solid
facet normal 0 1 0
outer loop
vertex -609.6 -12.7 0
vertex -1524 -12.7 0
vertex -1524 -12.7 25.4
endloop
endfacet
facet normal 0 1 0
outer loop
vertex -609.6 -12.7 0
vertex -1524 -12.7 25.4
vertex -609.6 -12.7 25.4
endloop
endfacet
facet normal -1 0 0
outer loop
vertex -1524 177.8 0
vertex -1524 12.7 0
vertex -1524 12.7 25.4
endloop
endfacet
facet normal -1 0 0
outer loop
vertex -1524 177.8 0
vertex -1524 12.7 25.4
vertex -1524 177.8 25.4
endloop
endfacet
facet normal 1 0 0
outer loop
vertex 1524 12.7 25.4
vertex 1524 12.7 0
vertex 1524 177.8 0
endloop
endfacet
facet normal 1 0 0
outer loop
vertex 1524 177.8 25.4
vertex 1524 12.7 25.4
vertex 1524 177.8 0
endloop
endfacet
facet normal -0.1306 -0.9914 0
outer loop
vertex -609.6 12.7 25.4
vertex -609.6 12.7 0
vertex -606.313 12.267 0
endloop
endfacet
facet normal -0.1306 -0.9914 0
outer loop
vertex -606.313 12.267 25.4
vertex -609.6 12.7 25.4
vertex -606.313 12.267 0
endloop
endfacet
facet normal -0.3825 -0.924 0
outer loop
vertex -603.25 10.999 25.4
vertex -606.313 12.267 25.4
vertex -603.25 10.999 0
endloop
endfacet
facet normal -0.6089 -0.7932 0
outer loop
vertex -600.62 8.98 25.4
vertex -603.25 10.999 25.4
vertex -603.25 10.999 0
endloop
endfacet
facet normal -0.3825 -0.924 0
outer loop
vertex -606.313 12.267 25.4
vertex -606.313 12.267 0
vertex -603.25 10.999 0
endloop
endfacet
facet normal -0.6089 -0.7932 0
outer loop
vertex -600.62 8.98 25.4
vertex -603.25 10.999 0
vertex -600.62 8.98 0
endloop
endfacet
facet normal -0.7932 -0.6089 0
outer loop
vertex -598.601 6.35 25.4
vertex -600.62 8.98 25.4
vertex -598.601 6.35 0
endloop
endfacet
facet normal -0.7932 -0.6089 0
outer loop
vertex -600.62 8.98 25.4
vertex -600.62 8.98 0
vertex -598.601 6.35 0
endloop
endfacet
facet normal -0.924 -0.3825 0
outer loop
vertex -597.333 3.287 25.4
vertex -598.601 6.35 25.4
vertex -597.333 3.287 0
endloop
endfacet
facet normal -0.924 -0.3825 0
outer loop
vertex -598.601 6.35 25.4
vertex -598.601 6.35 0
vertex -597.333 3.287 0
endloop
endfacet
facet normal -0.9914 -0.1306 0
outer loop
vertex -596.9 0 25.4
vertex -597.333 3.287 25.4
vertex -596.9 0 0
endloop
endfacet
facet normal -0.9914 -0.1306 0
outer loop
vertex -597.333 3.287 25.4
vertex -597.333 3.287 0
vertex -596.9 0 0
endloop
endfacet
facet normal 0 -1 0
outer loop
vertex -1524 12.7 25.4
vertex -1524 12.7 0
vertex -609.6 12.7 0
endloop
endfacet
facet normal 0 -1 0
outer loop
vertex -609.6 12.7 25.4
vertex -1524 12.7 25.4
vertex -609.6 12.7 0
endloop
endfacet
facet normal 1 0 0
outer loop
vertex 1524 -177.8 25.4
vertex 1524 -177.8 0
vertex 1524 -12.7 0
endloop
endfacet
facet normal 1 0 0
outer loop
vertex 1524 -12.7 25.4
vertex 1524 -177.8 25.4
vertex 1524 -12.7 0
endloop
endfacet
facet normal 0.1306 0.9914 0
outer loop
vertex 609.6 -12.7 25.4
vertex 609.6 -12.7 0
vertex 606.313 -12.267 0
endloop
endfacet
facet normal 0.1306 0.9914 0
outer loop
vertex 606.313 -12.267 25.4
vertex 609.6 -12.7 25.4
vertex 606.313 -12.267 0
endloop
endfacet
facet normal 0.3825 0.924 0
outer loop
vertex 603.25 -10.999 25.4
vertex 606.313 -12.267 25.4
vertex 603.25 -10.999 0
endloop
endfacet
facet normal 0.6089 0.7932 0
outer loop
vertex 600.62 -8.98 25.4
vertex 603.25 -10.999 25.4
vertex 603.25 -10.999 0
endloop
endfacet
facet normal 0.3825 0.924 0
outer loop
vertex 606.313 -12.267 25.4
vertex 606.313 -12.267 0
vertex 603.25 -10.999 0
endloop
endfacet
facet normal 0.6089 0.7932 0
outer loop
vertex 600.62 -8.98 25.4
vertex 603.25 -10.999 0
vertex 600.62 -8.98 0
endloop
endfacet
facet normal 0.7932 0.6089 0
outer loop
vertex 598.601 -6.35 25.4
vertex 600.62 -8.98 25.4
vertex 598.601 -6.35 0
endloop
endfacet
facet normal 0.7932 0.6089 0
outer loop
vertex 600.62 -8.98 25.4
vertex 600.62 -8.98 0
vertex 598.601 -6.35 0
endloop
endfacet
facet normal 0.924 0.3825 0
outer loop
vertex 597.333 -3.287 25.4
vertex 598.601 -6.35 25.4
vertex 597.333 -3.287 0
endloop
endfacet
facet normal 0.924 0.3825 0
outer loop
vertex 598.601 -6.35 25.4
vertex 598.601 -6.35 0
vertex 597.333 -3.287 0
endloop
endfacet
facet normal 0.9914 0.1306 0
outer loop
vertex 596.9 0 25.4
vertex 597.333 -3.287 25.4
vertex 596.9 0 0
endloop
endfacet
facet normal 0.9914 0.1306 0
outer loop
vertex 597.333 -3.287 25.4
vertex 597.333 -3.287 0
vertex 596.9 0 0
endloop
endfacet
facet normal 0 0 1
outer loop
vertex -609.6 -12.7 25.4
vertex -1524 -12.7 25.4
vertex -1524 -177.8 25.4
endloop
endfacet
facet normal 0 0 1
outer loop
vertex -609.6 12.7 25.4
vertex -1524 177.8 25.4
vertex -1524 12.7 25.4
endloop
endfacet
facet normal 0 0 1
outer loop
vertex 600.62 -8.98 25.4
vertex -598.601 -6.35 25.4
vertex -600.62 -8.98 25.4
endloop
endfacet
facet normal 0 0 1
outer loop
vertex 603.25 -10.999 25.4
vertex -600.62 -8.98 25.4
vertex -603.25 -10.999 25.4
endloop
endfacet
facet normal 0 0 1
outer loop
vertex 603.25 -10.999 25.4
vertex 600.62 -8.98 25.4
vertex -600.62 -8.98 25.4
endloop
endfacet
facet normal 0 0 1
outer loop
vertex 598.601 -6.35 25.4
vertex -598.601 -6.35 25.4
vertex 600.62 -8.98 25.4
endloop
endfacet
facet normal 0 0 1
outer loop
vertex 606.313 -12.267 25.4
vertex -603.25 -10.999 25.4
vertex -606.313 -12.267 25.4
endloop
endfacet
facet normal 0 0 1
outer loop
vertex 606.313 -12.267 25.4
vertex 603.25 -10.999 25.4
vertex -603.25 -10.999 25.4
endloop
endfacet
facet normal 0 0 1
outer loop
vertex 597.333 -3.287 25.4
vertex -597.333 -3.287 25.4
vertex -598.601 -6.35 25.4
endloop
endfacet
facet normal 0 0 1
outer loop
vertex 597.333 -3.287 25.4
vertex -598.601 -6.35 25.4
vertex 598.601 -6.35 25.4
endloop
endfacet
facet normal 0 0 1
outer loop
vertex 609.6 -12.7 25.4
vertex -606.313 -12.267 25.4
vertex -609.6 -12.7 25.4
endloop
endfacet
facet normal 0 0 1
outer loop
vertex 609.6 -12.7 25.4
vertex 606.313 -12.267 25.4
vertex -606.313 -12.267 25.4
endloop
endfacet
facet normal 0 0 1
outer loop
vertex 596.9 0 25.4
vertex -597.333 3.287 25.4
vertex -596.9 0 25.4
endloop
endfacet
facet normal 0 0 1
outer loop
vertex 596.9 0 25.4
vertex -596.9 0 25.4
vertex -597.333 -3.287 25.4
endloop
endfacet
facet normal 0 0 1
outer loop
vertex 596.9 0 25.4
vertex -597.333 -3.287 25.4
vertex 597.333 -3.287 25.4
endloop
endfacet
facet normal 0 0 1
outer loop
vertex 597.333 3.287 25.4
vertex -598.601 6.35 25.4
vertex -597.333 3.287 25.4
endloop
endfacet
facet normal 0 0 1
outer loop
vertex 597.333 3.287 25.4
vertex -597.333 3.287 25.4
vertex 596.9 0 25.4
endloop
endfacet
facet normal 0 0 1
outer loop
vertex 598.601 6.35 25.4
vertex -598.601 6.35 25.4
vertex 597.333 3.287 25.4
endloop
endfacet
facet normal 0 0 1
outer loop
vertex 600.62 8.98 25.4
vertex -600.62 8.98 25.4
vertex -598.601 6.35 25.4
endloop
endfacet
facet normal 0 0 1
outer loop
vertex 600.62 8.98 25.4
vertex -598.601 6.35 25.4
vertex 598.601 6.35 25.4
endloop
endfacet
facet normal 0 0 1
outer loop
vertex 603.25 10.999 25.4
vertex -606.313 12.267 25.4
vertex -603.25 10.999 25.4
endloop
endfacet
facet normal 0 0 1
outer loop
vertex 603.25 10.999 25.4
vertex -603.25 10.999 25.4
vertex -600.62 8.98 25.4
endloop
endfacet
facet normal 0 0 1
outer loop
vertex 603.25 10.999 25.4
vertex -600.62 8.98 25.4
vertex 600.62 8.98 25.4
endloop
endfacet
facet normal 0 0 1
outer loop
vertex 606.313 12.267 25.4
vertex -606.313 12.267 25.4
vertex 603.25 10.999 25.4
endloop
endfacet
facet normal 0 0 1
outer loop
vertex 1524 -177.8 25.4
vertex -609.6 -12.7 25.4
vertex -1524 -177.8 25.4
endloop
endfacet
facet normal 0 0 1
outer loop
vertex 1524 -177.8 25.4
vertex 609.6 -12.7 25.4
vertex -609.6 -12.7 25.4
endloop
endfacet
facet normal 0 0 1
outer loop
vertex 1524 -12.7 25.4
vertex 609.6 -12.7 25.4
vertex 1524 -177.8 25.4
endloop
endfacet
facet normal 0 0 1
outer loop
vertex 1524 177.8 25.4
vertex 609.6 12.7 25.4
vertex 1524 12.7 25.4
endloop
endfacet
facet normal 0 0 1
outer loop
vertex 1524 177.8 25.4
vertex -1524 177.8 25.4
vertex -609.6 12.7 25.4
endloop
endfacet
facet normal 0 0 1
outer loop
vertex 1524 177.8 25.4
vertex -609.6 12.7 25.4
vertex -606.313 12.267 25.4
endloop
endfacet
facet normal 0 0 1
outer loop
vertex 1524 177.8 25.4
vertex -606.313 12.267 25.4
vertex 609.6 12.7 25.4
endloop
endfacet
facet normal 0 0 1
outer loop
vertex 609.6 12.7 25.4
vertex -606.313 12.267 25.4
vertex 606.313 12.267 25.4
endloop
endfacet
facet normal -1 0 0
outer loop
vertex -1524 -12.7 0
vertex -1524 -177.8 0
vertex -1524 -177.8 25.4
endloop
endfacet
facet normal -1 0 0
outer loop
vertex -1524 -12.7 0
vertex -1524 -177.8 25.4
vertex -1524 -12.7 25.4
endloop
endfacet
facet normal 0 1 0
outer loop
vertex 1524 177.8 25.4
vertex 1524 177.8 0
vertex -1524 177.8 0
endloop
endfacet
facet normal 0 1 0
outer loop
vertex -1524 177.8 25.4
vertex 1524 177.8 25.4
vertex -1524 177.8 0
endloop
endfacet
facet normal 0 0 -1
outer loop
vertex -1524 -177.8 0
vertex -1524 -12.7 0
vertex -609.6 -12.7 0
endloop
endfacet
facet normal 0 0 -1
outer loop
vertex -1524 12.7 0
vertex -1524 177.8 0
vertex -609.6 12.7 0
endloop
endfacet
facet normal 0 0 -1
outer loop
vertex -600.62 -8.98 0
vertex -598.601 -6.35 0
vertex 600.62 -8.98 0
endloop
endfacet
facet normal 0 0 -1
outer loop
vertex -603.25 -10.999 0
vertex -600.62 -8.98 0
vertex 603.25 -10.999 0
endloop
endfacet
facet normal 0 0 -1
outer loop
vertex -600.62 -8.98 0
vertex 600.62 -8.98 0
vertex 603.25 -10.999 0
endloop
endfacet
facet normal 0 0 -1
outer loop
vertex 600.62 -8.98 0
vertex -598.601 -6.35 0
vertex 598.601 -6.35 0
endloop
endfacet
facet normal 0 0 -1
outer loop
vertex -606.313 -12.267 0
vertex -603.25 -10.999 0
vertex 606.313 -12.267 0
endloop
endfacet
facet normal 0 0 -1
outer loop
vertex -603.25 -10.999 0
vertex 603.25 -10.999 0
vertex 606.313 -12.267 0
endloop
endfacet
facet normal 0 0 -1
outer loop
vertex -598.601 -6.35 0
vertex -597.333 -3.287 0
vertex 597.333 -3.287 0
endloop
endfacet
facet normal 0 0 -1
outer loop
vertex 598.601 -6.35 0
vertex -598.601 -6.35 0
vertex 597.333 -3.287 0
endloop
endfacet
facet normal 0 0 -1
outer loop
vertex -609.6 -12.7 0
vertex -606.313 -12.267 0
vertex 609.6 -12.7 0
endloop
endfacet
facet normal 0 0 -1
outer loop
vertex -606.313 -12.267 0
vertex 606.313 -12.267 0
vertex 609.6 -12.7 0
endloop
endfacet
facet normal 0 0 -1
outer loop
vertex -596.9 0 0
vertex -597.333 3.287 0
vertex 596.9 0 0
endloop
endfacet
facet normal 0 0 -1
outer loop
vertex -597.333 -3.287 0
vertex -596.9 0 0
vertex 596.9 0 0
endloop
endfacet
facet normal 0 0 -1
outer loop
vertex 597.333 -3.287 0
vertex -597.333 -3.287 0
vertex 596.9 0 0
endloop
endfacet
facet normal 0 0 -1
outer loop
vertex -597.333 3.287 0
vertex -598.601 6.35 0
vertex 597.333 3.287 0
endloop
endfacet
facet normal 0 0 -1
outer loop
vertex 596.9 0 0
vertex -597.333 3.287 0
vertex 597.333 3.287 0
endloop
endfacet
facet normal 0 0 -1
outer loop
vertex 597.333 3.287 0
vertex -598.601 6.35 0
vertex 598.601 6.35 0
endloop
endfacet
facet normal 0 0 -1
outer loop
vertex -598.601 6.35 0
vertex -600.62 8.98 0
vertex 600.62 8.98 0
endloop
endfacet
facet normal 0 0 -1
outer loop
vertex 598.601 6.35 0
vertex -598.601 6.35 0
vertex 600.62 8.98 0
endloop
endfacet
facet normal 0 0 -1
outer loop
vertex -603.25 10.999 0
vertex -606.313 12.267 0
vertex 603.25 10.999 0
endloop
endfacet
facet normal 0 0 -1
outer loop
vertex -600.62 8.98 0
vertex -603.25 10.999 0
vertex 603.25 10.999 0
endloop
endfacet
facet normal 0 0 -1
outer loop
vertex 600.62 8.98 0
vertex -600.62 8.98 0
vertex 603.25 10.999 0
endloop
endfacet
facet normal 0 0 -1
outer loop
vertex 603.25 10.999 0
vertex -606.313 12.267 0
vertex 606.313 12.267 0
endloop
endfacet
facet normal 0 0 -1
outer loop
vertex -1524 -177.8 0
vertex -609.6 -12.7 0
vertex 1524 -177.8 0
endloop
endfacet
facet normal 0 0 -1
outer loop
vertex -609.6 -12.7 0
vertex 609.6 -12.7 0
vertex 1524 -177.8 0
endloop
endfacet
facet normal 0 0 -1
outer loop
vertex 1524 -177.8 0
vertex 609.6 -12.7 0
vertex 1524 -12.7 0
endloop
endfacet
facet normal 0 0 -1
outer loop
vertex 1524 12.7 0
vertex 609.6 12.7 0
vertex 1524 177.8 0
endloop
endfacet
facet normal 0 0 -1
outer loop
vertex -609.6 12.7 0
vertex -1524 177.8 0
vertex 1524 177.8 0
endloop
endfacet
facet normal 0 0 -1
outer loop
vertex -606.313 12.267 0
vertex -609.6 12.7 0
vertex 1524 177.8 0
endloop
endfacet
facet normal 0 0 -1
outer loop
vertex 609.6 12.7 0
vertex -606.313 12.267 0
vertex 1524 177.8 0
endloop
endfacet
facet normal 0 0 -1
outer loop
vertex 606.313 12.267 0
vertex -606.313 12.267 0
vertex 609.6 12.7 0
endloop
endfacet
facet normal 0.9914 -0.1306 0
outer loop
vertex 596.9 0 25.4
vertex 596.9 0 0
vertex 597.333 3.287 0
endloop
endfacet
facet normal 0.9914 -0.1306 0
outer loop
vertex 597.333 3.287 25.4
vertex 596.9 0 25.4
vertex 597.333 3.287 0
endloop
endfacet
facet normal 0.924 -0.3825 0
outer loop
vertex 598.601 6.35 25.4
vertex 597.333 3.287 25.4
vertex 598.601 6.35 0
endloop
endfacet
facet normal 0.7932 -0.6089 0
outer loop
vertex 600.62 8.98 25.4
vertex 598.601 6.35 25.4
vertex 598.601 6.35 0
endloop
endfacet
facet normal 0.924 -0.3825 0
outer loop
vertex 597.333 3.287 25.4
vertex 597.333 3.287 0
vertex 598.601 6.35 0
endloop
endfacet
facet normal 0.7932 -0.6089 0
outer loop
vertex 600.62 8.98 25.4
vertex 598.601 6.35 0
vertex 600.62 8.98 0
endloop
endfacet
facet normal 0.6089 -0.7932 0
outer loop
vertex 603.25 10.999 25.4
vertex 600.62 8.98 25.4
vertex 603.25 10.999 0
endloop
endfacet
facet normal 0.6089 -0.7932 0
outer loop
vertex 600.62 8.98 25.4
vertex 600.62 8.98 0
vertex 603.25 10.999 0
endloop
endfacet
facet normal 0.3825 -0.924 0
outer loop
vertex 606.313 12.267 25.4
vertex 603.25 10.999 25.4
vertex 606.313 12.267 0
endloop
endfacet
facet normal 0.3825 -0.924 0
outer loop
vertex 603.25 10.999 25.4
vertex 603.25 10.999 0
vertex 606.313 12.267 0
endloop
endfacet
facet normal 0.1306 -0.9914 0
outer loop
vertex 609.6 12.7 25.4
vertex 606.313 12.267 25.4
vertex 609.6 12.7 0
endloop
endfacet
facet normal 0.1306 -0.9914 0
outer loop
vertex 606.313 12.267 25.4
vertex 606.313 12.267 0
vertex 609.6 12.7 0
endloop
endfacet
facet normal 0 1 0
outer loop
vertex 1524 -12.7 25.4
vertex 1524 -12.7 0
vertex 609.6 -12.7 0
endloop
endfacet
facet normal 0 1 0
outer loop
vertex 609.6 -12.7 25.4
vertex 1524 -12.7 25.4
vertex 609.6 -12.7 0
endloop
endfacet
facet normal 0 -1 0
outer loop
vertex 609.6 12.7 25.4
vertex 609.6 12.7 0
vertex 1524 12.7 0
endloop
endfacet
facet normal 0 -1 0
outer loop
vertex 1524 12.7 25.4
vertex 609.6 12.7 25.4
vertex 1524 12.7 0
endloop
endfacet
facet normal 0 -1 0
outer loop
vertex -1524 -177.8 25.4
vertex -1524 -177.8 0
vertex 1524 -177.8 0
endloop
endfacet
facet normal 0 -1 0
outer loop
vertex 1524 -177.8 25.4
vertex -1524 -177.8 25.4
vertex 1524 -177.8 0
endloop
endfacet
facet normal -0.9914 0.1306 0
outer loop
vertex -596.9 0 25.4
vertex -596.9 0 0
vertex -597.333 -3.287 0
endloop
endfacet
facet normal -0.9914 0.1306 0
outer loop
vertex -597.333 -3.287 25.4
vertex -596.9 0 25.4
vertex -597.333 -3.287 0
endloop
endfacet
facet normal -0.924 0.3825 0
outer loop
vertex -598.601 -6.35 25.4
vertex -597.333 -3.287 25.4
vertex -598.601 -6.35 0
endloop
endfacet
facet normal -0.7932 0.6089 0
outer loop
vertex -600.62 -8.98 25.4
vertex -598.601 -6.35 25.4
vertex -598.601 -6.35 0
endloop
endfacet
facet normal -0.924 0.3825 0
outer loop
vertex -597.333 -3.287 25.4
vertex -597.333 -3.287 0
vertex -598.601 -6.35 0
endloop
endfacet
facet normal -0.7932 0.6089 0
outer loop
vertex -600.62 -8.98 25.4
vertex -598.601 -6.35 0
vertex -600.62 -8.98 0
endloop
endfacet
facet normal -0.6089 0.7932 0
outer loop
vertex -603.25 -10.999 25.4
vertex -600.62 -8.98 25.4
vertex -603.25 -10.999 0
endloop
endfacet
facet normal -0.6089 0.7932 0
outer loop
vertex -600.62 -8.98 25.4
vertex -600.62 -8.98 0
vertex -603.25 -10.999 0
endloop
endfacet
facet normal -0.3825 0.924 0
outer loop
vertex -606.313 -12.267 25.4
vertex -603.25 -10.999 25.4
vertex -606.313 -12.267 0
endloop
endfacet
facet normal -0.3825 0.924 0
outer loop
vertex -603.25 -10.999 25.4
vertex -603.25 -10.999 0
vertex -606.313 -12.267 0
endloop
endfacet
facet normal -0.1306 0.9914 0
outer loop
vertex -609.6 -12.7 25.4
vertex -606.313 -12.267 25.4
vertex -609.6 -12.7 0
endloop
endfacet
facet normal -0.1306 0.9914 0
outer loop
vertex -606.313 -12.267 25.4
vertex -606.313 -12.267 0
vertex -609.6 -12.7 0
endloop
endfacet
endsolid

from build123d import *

# Parameters (mm, degrees)
F0_W     = 914.4
F0_H     = 165.1
F1_DEPTH = 25.4


with BuildPart() as f1:
    # F0 (on Top) → F1 (new body)
    with BuildSketch(Plane.XY):
        with Locations((-1066.8, 95.25)):
            Rectangle(F0_W, F0_H)
        with BuildLine():
            Line((1524, 177.8), (-609.6, 177.8))
            Line((-609.6, 177.8), (-609.6, 12.7))
            ThreePointArc((-609.6, 12.7), (-600.619744, 8.980256), (-596.9, 0))
            Line((-596.9, 0), (596.9, 0))
            ThreePointArc((596.9, 0), (600.619744, 8.980256), (609.6, 12.7))
            Line((609.6, 12.7), (1524, 12.7))
            Line((1524, 12.7), (1524, 177.8))
        make_face()
        with BuildLine():
            Line((596.9, 0), (-596.9, 0))
            ThreePointArc((-596.9, 0), (-600.619744, -8.980256), (-609.6, -12.7))
            Line((-609.6, -12.7), (-609.6, -177.8))
            Line((-609.6, -177.8), (1524, -177.8))
            Line((1524, -177.8), (1524, -12.7))
            Line((1524, -12.7), (609.6, -12.7))
            ThreePointArc((609.6, -12.7), (600.619744, -8.980256), (596.9, 0))
        make_face()
        with Locations((-1066.8, -95.25)):
            Rectangle(F0_W, F0_H)
    extrude(amount=F1_DEPTH)


solid = f1.part
